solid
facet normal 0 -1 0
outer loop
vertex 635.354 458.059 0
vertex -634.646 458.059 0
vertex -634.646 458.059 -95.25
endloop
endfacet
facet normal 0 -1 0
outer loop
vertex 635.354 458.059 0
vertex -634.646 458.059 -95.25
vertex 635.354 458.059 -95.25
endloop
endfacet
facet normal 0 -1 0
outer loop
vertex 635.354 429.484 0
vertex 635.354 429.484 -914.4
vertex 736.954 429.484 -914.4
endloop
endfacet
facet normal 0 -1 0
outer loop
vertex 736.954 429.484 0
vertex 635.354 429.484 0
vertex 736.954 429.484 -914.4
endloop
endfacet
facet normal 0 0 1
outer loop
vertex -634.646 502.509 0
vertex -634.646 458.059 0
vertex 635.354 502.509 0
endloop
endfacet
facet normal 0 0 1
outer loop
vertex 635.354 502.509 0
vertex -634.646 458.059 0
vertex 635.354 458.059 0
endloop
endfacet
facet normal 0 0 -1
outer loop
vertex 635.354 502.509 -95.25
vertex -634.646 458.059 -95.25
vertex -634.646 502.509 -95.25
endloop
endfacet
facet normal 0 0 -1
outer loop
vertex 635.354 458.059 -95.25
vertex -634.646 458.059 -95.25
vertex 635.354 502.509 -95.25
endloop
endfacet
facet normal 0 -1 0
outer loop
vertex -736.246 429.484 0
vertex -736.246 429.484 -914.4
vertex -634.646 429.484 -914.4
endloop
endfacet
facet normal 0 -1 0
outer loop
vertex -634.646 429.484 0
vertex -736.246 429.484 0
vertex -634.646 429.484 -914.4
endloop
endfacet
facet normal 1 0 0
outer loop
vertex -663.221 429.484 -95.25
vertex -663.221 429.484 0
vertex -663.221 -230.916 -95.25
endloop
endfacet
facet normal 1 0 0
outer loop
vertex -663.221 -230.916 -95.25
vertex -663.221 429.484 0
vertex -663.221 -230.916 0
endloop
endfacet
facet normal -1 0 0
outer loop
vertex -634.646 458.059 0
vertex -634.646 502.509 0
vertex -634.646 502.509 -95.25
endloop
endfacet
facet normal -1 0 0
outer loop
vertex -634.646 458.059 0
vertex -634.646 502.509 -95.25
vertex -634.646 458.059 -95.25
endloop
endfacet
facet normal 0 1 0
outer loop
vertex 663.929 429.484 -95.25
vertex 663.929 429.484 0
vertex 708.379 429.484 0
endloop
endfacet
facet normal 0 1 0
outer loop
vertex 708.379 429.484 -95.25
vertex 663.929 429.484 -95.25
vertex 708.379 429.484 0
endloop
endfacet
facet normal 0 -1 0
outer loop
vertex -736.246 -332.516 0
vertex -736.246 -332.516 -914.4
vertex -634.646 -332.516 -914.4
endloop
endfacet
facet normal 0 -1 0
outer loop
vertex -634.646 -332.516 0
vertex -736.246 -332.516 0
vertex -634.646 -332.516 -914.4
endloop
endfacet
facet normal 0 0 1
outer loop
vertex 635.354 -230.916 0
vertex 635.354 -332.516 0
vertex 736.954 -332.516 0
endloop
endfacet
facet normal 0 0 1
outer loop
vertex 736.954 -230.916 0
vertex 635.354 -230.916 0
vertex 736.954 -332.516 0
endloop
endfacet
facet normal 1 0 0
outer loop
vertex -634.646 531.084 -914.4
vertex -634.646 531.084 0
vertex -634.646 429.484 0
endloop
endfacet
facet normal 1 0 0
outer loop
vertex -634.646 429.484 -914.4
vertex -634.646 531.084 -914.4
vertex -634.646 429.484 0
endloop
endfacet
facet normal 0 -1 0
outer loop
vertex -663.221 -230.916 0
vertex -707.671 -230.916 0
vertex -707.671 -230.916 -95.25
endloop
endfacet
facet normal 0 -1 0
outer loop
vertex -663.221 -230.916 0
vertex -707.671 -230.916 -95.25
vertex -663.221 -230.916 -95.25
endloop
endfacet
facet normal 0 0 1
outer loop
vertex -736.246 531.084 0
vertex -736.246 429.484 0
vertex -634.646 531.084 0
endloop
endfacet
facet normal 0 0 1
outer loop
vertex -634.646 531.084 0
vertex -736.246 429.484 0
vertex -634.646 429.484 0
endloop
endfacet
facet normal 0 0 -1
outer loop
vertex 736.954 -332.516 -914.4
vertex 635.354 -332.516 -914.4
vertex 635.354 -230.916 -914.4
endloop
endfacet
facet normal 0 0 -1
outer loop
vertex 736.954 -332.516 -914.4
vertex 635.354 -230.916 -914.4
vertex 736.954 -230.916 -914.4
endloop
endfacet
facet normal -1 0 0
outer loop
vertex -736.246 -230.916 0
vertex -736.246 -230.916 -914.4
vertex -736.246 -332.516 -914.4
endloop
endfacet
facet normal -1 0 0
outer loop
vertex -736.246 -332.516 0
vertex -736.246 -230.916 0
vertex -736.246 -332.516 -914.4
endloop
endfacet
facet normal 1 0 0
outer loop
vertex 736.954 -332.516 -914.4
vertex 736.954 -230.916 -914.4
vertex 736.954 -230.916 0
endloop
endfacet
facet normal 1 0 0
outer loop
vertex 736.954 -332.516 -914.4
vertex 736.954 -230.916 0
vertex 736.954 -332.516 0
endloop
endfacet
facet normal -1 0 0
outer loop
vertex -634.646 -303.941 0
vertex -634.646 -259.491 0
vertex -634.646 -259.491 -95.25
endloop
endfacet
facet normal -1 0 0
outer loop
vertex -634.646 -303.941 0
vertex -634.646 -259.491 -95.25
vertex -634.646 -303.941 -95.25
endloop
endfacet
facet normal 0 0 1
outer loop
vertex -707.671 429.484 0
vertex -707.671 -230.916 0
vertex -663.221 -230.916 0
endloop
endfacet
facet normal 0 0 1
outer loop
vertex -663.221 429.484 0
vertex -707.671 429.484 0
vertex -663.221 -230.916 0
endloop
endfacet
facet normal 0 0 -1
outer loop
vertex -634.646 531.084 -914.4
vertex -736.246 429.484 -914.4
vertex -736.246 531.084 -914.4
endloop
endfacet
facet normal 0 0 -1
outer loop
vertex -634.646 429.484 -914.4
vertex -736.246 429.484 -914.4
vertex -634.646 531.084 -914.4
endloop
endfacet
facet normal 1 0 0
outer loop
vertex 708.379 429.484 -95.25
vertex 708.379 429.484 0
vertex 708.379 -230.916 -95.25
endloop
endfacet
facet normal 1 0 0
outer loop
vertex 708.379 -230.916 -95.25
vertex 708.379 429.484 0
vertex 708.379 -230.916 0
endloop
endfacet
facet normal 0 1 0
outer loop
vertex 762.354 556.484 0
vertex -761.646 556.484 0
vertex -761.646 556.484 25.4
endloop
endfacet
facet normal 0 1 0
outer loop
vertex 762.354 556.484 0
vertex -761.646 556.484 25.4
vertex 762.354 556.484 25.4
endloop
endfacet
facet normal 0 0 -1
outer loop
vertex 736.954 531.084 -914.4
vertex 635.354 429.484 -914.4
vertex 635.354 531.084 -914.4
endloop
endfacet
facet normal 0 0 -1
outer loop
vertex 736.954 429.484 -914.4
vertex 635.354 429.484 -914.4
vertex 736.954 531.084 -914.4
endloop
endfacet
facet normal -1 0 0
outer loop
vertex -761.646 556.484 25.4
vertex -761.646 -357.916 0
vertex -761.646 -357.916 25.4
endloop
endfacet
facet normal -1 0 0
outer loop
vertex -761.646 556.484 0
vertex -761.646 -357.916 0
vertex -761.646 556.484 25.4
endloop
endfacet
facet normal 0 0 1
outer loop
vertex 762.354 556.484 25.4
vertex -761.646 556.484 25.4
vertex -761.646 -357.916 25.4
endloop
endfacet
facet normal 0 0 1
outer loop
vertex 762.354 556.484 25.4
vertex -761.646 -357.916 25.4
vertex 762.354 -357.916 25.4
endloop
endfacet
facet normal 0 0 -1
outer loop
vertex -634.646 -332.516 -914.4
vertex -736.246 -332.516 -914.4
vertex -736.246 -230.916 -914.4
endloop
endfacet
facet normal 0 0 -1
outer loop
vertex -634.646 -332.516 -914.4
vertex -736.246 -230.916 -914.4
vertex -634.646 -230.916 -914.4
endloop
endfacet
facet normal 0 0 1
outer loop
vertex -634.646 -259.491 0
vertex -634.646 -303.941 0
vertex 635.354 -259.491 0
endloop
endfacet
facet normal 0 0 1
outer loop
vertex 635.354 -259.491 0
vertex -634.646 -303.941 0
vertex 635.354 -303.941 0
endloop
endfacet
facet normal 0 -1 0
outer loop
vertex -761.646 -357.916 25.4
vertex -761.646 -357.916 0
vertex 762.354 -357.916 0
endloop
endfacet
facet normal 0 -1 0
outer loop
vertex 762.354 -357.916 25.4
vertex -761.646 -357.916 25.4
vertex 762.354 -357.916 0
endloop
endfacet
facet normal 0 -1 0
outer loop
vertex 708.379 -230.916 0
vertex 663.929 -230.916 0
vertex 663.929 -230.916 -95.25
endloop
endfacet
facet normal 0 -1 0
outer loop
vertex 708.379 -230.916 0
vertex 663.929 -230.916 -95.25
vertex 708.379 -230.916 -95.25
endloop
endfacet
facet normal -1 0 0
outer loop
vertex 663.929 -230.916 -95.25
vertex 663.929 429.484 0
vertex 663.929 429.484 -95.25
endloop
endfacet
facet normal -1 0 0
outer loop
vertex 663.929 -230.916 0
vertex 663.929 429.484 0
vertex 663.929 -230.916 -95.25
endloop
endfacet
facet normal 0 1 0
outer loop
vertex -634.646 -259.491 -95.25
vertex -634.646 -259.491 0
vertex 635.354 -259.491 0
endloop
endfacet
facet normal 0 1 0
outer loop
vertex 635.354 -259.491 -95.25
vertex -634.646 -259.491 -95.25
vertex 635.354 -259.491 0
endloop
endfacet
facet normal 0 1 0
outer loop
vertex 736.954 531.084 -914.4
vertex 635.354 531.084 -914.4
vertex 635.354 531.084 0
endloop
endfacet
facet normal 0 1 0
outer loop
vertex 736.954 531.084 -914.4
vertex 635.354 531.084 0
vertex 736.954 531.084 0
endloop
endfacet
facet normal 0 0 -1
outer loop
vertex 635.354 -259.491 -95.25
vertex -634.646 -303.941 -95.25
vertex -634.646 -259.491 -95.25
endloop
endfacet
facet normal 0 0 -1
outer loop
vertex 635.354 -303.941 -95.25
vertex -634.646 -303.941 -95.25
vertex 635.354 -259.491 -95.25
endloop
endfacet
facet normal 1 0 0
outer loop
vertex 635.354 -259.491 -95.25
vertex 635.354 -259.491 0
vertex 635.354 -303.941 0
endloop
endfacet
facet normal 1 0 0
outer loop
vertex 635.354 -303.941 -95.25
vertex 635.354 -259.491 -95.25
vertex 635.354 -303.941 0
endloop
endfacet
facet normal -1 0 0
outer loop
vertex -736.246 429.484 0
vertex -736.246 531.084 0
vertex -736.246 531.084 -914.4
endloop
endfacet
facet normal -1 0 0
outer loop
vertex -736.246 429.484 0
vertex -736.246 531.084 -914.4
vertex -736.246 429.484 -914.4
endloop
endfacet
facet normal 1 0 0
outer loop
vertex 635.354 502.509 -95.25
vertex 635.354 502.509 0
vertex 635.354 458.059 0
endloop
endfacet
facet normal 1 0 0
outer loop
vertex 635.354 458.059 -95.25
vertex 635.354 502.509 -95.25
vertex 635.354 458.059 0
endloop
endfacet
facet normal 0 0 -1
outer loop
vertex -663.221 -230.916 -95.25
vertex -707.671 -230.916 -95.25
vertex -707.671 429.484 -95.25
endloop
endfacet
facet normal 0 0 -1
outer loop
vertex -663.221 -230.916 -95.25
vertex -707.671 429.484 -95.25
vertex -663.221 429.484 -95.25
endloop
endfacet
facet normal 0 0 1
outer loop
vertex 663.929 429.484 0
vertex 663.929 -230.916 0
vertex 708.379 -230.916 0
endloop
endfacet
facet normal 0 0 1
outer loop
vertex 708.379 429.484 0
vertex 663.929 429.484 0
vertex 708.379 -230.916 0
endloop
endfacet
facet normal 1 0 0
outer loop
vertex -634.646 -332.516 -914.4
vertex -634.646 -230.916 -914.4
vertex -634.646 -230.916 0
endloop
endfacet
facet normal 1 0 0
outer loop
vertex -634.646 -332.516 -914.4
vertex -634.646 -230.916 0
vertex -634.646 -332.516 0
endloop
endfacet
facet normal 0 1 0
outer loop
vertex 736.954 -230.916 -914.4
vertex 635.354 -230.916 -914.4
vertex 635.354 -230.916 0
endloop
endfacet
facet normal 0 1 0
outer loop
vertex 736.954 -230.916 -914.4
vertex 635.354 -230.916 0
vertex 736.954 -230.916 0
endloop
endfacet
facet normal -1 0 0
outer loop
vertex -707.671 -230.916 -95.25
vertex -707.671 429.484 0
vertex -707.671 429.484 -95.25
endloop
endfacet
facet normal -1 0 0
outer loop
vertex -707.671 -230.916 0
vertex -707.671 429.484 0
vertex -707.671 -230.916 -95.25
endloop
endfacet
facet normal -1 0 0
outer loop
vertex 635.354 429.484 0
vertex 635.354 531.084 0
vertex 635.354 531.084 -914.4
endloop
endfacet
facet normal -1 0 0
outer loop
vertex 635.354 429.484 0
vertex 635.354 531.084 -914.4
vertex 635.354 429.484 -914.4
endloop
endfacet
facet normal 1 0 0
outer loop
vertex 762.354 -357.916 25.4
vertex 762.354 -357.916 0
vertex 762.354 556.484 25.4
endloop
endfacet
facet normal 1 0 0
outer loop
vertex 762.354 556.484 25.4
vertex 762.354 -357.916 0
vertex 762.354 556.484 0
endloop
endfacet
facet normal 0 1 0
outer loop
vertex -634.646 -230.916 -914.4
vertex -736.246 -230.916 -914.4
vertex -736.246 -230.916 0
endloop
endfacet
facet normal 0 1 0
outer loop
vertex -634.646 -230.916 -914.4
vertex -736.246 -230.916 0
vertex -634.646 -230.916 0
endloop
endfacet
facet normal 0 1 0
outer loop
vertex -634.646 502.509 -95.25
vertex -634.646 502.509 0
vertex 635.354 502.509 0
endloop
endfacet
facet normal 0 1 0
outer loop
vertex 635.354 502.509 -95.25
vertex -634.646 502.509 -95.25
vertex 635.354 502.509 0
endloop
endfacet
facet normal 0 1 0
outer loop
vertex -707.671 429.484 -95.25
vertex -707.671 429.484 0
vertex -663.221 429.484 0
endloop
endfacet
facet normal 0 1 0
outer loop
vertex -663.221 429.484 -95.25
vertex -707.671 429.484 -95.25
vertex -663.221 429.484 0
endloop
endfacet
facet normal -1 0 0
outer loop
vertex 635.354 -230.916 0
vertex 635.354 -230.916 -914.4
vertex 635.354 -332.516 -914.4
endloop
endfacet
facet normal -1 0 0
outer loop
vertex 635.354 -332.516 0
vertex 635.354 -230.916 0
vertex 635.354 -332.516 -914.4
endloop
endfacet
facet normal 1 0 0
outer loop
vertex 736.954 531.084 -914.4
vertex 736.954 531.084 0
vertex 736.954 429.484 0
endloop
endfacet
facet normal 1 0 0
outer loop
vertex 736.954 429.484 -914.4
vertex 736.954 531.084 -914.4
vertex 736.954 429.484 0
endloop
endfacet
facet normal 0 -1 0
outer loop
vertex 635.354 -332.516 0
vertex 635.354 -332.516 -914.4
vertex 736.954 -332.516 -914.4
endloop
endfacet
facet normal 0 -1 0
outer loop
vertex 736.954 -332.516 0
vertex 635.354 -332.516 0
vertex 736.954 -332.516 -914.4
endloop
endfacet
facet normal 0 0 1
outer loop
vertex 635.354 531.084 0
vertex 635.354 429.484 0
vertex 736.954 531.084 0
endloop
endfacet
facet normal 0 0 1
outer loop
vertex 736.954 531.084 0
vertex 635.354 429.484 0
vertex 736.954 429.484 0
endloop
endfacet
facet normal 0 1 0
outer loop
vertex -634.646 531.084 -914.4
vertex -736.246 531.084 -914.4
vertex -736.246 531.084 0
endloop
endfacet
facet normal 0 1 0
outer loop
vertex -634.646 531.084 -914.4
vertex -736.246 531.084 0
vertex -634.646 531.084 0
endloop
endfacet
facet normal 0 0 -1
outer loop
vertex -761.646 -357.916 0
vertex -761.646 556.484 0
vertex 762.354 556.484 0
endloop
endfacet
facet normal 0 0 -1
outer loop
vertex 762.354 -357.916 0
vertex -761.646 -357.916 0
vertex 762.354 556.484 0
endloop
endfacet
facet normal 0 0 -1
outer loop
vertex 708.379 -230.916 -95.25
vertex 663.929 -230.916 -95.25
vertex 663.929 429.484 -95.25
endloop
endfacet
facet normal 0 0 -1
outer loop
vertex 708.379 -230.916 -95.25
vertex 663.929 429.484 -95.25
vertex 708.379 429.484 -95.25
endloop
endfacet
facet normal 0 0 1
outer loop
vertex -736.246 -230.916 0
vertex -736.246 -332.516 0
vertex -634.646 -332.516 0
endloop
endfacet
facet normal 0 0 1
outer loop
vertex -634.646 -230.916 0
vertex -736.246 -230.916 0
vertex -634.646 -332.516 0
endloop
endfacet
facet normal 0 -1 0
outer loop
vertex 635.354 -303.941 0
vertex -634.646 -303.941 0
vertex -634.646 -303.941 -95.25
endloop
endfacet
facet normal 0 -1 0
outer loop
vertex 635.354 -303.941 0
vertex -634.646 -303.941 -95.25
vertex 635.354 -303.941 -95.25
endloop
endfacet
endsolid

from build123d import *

# Parameters (mm, degrees)
F0_W     = 1524
F0_H     = 914.4
F1_DEPTH = 25.4
F2_W     = 101.6
F2_H     = 101.6
F3_DEPTH = 914.4
F4_W     = 1270
F4_H     = 44.45
F4_W_2   = 44.45
F4_H_2   = 660.4
F5_DEPTH = 95.25


with BuildPart() as f1:
    # F0 (on Top) → F1 (new body)
    with BuildSketch(Plane.XY):
        with Locations((0.354476, 99.283996)):
            Rectangle(F0_W, F0_H)
    extrude(amount=F1_DEPTH)


with BuildPart() as f3:
    # F2 (on face) → F3 (new body)
    with BuildSketch(Plane(origin=(0, 0, 0), x_dir=(1, 0, 0), z_dir=(0, 0, -1))):
        with Locations((-685.445524, 281.716004)):
            Rectangle(F2_W, F2_H)
        with Locations((-685.445524, -480.283996)):
            Rectangle(F2_W, F2_H)
        with Locations((686.154476, -480.283996)):
            Rectangle(F2_W, F2_H)
        with Locations((686.154476, 281.716004)):
            Rectangle(F2_W, F2_H)
    extrude(amount=F3_DEPTH)


with BuildPart() as f5:
    # F4 (on face) → F5 (new body)
    with BuildSketch(Plane(origin=(0, 0, 0), x_dir=(1, 0, 0), z_dir=(0, 0, -1))):
        with Locations((0.354476, 281.716004)):
            Rectangle(F4_W, F4_H)
        with Locations((686.154476, -99.283996)):
            Rectangle(F4_W_2, F4_H_2)
        with Locations((0.354476, -480.283996)):
            Rectangle(F4_W, F4_H)
        with Locations((-685.445524, -99.283996)):
            Rectangle(F4_W_2, F4_H_2)
    extrude(amount=F5_DEPTH)


solid = Compound([f1.part, f3.part, f5.part])
